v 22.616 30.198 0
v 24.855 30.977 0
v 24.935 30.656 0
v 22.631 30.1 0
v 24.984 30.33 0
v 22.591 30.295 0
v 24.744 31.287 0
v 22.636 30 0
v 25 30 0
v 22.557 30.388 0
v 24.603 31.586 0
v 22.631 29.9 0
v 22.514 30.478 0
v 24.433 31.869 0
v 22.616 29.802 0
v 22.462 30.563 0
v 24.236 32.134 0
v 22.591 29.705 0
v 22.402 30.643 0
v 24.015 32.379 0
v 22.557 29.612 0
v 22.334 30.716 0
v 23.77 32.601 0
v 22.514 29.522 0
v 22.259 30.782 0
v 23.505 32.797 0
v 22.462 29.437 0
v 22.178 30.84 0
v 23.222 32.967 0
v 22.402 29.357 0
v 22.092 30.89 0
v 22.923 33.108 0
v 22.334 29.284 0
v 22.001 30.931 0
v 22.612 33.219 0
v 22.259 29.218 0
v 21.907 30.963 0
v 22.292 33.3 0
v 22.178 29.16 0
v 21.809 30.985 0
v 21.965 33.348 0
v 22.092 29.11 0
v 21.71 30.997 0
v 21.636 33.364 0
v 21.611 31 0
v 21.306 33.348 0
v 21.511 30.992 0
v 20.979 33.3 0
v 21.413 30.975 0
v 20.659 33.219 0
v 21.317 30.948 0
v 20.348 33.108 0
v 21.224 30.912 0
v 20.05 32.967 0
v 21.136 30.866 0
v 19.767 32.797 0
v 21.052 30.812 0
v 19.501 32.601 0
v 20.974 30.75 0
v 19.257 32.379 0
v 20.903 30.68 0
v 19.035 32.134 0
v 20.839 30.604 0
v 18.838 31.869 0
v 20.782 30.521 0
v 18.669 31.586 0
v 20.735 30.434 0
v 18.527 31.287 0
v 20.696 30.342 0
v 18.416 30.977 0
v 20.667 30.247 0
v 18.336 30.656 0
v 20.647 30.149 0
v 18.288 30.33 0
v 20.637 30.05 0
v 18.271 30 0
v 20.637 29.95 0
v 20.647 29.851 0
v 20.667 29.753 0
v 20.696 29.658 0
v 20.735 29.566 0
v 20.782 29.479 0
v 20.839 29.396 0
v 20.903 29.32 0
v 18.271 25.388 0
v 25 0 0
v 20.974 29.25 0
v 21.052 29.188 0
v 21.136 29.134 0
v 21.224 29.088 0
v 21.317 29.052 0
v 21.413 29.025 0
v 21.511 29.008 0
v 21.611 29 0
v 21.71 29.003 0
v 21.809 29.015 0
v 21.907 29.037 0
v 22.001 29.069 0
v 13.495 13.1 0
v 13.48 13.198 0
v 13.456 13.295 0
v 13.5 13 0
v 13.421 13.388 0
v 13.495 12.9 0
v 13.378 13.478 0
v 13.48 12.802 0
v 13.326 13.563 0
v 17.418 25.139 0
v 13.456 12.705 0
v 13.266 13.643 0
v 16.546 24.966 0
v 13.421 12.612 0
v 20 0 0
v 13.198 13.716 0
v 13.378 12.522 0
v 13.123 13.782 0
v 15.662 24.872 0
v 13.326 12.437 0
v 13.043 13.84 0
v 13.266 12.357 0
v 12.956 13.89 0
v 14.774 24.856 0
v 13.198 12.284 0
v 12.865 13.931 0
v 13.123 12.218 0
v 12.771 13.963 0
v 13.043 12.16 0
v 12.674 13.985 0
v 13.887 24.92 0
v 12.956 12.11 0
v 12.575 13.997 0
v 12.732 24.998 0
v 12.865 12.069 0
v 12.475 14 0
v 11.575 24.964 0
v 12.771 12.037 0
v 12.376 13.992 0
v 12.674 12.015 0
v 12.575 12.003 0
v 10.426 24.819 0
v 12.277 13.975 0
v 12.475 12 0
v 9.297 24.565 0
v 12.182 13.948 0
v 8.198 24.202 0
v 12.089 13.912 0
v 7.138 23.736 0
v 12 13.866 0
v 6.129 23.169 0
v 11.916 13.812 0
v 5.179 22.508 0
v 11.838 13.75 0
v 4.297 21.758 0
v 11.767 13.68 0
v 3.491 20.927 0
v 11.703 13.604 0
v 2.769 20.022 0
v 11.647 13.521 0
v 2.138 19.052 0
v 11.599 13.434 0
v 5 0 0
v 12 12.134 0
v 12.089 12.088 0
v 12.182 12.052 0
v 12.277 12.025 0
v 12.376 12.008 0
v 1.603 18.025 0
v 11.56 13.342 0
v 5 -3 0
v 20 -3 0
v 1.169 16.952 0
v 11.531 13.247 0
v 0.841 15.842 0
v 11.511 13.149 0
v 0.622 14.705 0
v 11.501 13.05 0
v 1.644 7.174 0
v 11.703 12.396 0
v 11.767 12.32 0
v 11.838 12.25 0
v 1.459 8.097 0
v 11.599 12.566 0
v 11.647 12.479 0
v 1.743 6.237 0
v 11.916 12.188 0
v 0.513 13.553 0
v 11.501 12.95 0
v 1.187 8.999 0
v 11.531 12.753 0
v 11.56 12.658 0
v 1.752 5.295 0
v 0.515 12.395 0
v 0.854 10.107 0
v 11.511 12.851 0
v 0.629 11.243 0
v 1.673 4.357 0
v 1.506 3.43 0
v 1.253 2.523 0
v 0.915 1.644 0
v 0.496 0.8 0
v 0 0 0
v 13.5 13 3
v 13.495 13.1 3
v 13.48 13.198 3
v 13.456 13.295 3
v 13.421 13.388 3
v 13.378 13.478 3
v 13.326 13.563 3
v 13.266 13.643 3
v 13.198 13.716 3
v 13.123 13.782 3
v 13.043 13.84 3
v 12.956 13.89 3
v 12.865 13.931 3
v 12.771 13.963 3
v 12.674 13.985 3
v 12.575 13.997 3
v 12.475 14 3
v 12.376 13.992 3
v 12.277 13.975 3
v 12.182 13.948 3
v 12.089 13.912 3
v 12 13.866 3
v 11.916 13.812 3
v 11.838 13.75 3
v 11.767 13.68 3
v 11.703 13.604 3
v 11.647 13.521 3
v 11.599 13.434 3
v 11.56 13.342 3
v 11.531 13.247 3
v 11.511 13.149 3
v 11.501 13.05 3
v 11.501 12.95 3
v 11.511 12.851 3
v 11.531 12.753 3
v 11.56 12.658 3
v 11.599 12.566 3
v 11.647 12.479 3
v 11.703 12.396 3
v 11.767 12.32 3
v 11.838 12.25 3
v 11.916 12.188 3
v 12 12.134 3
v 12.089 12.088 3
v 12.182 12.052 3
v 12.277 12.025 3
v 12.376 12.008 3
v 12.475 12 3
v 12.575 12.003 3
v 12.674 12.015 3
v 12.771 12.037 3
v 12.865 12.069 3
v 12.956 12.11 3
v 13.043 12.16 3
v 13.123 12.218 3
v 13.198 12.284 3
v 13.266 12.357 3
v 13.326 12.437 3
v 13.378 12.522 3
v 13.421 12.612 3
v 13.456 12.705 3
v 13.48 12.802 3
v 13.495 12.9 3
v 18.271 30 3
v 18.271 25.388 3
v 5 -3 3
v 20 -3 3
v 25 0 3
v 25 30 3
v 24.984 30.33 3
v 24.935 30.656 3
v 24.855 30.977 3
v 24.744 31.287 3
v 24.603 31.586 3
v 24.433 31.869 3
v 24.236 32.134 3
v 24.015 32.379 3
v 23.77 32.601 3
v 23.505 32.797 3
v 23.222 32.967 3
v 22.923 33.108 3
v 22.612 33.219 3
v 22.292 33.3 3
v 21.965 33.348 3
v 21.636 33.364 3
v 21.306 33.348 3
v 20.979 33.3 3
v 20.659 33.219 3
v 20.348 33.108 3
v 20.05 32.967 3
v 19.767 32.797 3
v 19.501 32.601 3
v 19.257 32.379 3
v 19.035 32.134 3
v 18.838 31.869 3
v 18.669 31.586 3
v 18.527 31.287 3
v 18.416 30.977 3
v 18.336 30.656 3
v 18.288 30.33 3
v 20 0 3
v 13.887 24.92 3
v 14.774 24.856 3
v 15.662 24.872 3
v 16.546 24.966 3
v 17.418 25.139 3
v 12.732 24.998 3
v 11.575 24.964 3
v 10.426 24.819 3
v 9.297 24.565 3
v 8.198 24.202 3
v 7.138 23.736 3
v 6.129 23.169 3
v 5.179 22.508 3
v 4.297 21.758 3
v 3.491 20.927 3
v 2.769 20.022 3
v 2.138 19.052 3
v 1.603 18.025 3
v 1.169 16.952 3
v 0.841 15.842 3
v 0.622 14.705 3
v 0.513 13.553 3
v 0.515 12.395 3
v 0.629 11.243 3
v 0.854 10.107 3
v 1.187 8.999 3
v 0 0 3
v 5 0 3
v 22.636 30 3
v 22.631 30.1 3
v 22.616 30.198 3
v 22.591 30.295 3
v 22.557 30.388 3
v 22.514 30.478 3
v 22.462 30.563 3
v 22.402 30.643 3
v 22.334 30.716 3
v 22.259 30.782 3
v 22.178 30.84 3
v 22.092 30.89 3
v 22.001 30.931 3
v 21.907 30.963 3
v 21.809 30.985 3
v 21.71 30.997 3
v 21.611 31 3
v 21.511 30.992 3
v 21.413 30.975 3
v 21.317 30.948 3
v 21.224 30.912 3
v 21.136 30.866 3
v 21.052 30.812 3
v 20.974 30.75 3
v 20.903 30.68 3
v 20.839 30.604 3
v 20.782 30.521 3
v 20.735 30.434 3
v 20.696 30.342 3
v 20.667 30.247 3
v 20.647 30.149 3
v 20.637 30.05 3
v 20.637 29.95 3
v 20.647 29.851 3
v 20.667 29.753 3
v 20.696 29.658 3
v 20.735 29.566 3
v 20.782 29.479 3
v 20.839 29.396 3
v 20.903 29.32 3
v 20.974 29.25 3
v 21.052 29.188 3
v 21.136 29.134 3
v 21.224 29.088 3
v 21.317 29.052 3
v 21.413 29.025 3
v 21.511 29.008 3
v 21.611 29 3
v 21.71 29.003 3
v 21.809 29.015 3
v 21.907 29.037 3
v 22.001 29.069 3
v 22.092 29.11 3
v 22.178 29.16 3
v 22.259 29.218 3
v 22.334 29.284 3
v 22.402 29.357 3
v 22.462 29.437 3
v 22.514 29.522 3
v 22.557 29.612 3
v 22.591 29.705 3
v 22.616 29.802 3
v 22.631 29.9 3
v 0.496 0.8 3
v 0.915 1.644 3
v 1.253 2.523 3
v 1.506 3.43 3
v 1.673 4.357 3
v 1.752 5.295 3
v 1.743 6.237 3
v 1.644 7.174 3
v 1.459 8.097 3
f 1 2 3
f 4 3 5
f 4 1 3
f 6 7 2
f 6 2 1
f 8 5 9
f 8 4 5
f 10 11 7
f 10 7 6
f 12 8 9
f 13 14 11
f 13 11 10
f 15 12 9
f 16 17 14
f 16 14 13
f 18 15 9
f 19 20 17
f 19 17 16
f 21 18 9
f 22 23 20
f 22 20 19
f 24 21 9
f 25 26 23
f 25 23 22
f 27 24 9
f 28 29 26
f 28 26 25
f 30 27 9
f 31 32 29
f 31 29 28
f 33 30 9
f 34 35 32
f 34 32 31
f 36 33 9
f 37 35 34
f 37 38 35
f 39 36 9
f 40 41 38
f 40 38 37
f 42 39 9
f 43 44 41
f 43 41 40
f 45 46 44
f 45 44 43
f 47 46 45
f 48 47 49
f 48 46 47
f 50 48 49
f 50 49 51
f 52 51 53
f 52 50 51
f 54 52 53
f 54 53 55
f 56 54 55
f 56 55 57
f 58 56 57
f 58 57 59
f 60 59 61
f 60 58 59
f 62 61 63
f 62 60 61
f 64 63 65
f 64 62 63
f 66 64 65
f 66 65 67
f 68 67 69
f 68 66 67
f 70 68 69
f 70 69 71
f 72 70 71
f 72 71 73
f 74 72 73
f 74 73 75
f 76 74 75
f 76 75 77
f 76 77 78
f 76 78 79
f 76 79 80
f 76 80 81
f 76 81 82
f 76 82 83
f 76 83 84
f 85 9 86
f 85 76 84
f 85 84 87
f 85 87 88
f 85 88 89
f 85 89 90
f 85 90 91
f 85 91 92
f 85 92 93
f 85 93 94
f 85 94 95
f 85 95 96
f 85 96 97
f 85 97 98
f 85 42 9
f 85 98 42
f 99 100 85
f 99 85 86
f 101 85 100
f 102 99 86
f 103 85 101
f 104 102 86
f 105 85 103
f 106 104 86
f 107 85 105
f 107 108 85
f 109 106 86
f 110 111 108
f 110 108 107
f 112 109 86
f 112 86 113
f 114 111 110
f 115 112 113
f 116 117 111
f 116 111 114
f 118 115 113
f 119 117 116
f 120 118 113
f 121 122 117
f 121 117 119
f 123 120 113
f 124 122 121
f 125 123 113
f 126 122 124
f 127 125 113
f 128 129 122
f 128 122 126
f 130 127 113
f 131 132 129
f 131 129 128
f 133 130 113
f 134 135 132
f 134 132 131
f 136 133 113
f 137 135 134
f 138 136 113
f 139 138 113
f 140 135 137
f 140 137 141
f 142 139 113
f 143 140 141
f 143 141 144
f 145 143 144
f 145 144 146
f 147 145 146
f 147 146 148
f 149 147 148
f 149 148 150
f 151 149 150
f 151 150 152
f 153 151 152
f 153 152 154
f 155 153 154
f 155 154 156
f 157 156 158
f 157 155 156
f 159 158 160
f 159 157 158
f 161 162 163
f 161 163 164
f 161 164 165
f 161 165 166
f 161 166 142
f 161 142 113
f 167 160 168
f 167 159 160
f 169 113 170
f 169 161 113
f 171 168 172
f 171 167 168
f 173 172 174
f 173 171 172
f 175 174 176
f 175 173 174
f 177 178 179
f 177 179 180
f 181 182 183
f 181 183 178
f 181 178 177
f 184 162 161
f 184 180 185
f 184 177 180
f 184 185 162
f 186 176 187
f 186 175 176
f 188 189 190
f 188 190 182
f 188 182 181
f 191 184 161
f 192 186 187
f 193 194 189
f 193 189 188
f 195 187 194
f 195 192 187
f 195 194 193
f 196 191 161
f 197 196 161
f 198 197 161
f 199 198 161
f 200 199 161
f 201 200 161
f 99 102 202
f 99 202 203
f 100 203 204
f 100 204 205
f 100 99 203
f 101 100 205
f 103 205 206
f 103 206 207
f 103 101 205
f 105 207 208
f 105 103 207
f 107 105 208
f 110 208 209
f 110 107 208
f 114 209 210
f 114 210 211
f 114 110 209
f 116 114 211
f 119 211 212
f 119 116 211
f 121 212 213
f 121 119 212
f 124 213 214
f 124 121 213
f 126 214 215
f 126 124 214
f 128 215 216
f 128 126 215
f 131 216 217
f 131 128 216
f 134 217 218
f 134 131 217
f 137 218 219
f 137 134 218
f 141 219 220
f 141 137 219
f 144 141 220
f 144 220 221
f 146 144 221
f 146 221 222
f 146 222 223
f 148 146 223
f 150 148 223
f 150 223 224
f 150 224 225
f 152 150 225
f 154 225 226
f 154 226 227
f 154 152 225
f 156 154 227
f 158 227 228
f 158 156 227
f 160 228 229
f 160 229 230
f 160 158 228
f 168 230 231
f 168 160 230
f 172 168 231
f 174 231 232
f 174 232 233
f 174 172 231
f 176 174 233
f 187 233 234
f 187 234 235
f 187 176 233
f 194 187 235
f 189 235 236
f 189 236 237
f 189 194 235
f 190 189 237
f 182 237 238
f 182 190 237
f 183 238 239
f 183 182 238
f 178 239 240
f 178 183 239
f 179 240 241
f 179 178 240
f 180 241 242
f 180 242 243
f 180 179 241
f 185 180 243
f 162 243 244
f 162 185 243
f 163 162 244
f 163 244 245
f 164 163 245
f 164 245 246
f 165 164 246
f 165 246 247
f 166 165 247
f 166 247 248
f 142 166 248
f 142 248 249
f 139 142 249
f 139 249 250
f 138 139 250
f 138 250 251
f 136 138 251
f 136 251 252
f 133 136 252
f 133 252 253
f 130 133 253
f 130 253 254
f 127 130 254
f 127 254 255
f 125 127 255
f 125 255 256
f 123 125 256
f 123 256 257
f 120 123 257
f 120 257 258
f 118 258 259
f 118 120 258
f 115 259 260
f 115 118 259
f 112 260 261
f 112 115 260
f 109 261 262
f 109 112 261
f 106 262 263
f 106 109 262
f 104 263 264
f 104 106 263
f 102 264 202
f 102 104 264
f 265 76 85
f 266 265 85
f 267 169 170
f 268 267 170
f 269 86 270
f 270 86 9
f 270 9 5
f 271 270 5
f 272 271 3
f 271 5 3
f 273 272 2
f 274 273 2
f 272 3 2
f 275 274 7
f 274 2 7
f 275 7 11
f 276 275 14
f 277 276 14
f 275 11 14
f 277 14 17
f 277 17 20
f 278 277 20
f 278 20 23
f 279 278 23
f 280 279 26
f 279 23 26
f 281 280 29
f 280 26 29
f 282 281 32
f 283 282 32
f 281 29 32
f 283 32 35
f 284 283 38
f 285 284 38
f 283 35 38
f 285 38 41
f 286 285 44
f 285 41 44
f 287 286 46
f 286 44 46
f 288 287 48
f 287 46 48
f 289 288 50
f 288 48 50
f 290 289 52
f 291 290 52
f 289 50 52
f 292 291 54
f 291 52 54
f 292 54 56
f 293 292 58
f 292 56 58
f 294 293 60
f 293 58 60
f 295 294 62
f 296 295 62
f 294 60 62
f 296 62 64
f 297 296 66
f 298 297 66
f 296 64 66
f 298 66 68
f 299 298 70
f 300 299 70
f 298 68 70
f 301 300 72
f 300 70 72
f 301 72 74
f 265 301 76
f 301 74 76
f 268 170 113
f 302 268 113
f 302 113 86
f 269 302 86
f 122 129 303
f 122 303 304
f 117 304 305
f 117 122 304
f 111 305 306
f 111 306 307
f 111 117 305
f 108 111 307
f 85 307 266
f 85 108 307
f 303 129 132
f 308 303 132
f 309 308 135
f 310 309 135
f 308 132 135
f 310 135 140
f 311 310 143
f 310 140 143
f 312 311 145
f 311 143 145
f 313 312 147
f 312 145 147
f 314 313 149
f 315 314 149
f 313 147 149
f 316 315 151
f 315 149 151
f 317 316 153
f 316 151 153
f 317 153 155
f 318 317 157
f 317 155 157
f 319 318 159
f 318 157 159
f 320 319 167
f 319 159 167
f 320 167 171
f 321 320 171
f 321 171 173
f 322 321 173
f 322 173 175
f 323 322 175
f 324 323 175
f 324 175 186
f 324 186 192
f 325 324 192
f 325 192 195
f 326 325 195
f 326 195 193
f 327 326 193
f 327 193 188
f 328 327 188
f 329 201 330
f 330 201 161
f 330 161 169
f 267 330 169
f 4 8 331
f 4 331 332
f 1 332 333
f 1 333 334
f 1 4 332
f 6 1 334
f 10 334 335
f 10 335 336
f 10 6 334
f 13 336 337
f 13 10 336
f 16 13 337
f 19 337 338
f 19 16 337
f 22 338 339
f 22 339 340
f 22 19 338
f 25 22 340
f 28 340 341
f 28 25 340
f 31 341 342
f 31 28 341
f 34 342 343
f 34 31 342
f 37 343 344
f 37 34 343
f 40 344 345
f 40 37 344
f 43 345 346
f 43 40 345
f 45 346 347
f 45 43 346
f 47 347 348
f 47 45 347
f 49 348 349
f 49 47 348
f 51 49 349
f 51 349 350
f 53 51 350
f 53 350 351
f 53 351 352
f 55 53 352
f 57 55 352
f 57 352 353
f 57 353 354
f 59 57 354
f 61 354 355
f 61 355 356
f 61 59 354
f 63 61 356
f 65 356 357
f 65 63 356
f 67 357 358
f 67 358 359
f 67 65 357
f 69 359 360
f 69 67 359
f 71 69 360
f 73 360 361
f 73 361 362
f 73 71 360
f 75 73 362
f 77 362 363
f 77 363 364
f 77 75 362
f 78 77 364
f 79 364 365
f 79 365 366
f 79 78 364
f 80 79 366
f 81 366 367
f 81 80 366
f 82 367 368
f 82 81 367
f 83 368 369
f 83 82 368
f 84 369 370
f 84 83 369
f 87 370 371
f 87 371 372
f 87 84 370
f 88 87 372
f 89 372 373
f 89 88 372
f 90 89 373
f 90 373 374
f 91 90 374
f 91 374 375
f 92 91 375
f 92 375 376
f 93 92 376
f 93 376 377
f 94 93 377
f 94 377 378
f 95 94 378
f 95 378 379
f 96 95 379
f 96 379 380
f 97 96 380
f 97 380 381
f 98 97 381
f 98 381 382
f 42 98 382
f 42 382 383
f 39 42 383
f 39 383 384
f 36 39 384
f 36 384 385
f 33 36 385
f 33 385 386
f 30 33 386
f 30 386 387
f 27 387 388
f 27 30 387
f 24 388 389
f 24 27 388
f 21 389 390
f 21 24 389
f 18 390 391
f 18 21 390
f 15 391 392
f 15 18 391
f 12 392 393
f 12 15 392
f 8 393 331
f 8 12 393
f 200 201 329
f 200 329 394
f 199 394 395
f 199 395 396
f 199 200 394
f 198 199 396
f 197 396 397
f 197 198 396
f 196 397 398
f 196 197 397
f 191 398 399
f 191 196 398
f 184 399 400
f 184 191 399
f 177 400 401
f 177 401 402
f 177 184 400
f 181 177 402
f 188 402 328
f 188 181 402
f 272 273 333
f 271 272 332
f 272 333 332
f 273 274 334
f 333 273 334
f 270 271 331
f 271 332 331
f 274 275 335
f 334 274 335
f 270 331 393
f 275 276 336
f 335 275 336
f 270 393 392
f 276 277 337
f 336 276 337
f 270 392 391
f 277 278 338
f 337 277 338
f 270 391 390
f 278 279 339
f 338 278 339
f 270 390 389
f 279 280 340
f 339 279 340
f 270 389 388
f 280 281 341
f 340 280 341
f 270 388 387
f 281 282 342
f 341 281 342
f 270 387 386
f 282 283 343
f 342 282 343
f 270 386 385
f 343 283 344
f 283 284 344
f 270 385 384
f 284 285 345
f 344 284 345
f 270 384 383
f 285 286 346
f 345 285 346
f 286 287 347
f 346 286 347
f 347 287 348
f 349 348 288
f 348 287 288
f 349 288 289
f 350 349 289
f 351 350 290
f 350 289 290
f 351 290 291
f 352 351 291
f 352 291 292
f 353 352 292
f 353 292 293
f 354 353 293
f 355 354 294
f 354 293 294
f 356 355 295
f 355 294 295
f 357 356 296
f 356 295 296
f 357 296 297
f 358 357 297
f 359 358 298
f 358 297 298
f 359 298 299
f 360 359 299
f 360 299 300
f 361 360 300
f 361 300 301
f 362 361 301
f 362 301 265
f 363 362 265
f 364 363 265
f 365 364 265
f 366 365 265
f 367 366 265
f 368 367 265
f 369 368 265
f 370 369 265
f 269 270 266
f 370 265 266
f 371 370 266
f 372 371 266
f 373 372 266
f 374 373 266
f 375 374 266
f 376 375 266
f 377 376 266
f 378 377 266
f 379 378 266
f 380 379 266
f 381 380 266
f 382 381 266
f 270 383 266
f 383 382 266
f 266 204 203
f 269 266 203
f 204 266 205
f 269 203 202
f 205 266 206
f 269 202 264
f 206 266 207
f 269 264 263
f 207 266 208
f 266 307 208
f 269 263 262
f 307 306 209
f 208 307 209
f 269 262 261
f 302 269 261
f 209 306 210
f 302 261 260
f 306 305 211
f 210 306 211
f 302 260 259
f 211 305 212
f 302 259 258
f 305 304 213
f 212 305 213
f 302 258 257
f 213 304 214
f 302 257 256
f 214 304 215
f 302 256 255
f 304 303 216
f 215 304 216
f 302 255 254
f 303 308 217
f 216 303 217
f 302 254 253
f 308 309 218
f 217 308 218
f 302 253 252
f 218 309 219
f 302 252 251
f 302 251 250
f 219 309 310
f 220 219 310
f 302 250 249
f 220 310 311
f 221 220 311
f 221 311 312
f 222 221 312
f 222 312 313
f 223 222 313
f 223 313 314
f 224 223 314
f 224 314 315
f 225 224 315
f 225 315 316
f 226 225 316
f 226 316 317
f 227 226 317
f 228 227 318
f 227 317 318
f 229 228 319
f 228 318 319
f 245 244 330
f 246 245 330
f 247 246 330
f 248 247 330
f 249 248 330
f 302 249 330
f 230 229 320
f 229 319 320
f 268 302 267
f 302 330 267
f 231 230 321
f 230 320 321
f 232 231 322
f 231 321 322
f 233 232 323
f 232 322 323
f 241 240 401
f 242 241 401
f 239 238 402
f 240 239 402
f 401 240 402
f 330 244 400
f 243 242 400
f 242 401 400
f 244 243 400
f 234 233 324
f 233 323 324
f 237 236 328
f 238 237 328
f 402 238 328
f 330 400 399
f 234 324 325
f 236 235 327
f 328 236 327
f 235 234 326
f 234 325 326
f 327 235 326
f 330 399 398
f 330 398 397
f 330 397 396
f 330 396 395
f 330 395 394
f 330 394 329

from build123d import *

# Parameters (mm, degrees)
SKETCH1_R           = 1
BOSS_EXTRUDE1_DEPTH = 3
FILLET2_R           = 10


with BuildPart() as part:
    # Sketch1 → Boss-Extrude1 (new body)
    with BuildSketch(Plane.XY):
        with BuildLine():
            Line((0, 0), (5, 0))
            Line((5, 0), (5, -3))
            Line((5, -3), (20, -3))
            Line((20, -3), (20, 0))
            Line((20, 0), (25, 0))
            Line((25, 0), (25, 30))
            ThreePointArc((25, 30), (21.635660943, 33.364339057), (18.271321885, 30))
            Line((18.271321885, 30), (18.271321885, 25.388028695))
            Line((18.271321885, 25.388028695), (17.277972917, 24.007768839))
            ThreePointArc((17.277972917, 24.007768839), (2.760122096, 20.009620418), (3.579412381, 4.97359878))
            Line((3.579412381, 4.97359878), (0, 0))
        make_face()
        with Locations((12.5, 13)):
            Circle(SKETCH1_R, mode=Mode.SUBTRACT)
        with Locations((21.635660943, 30)):
            Circle(SKETCH1_R, mode=Mode.SUBTRACT)
    extrude(amount=BOSS_EXTRUDE1_DEPTH)

    # Fillet2
    # the kernel refuses this fillet: 10 mm, written as the material it adds along each edge
    with BuildSketch(Plane(origin=(3.579412381, 4.97359878, 0), x_dir=(-0.5841350348464551, -0.8116564920364591, 0), z_dir=(0, 0, 1))) as fillet2_piece_1_section:
        with BuildLine():
            CenterArc((6.344003322, -9.997660671), FILLET2_R, 91.239343662, 53.979959966)
            Line((-1.869411105, -4.293291867), (-2.033679393, -4.179204491))
            ThreePointArc((-2.033679393, -4.179204491), (-0.906628796, -2.158871285), (-0.19542514, 0.042532512))
            Line((-0.19542514, 0.042532512), (0, 0.2))
            ThreePointArc((0, 0.2), (3.063856958, 0.2), (6.123388127, 0.199953213))
            Line((6.123388127, 0.199953213), (6.127713915, 0))
        make_face()
    fillet2_piece_1 = extrude(amount=3, mode=Mode.PRIVATE)
    fillet2_piece_1 = split(fillet2_piece_1, bisect_by=Plane(origin=(2.134897735, 0, 1.5), z_dir=(0, 1, 0)), keep=Keep.TOP, mode=Mode.PRIVATE)
    add(fillet2_piece_1)
    with BuildSketch(Plane(origin=(17.277972917, 24.007768839, 0), x_dir=(0.5841350348464545, 0.8116564920364596, 0), z_dir=(0, 0, 1))) as fillet2_piece_2:
        with BuildLine():
            CenterArc((7.496633226, 8.148949762), FILLET2_R, 209.104536821, 25.472441877)
            Line((-1.240703884, 3.284904099), (-1.415450626, 3.187623185))
            ThreePointArc((-1.415450626, 3.187623185), (-0.686649014, 1.617411734), (-0.19542514, -0.042532512))
            Line((-0.19542514, -0.042532512), (0, -0.2))
            ThreePointArc((0, -0.2), (0.850273404, -0.2), (1.584625079, -0.162978995))
            Line((1.584625079, -0.162978995), (1.700546807, 0))
        make_face()
    extrude(amount=3)


solid = part.part
